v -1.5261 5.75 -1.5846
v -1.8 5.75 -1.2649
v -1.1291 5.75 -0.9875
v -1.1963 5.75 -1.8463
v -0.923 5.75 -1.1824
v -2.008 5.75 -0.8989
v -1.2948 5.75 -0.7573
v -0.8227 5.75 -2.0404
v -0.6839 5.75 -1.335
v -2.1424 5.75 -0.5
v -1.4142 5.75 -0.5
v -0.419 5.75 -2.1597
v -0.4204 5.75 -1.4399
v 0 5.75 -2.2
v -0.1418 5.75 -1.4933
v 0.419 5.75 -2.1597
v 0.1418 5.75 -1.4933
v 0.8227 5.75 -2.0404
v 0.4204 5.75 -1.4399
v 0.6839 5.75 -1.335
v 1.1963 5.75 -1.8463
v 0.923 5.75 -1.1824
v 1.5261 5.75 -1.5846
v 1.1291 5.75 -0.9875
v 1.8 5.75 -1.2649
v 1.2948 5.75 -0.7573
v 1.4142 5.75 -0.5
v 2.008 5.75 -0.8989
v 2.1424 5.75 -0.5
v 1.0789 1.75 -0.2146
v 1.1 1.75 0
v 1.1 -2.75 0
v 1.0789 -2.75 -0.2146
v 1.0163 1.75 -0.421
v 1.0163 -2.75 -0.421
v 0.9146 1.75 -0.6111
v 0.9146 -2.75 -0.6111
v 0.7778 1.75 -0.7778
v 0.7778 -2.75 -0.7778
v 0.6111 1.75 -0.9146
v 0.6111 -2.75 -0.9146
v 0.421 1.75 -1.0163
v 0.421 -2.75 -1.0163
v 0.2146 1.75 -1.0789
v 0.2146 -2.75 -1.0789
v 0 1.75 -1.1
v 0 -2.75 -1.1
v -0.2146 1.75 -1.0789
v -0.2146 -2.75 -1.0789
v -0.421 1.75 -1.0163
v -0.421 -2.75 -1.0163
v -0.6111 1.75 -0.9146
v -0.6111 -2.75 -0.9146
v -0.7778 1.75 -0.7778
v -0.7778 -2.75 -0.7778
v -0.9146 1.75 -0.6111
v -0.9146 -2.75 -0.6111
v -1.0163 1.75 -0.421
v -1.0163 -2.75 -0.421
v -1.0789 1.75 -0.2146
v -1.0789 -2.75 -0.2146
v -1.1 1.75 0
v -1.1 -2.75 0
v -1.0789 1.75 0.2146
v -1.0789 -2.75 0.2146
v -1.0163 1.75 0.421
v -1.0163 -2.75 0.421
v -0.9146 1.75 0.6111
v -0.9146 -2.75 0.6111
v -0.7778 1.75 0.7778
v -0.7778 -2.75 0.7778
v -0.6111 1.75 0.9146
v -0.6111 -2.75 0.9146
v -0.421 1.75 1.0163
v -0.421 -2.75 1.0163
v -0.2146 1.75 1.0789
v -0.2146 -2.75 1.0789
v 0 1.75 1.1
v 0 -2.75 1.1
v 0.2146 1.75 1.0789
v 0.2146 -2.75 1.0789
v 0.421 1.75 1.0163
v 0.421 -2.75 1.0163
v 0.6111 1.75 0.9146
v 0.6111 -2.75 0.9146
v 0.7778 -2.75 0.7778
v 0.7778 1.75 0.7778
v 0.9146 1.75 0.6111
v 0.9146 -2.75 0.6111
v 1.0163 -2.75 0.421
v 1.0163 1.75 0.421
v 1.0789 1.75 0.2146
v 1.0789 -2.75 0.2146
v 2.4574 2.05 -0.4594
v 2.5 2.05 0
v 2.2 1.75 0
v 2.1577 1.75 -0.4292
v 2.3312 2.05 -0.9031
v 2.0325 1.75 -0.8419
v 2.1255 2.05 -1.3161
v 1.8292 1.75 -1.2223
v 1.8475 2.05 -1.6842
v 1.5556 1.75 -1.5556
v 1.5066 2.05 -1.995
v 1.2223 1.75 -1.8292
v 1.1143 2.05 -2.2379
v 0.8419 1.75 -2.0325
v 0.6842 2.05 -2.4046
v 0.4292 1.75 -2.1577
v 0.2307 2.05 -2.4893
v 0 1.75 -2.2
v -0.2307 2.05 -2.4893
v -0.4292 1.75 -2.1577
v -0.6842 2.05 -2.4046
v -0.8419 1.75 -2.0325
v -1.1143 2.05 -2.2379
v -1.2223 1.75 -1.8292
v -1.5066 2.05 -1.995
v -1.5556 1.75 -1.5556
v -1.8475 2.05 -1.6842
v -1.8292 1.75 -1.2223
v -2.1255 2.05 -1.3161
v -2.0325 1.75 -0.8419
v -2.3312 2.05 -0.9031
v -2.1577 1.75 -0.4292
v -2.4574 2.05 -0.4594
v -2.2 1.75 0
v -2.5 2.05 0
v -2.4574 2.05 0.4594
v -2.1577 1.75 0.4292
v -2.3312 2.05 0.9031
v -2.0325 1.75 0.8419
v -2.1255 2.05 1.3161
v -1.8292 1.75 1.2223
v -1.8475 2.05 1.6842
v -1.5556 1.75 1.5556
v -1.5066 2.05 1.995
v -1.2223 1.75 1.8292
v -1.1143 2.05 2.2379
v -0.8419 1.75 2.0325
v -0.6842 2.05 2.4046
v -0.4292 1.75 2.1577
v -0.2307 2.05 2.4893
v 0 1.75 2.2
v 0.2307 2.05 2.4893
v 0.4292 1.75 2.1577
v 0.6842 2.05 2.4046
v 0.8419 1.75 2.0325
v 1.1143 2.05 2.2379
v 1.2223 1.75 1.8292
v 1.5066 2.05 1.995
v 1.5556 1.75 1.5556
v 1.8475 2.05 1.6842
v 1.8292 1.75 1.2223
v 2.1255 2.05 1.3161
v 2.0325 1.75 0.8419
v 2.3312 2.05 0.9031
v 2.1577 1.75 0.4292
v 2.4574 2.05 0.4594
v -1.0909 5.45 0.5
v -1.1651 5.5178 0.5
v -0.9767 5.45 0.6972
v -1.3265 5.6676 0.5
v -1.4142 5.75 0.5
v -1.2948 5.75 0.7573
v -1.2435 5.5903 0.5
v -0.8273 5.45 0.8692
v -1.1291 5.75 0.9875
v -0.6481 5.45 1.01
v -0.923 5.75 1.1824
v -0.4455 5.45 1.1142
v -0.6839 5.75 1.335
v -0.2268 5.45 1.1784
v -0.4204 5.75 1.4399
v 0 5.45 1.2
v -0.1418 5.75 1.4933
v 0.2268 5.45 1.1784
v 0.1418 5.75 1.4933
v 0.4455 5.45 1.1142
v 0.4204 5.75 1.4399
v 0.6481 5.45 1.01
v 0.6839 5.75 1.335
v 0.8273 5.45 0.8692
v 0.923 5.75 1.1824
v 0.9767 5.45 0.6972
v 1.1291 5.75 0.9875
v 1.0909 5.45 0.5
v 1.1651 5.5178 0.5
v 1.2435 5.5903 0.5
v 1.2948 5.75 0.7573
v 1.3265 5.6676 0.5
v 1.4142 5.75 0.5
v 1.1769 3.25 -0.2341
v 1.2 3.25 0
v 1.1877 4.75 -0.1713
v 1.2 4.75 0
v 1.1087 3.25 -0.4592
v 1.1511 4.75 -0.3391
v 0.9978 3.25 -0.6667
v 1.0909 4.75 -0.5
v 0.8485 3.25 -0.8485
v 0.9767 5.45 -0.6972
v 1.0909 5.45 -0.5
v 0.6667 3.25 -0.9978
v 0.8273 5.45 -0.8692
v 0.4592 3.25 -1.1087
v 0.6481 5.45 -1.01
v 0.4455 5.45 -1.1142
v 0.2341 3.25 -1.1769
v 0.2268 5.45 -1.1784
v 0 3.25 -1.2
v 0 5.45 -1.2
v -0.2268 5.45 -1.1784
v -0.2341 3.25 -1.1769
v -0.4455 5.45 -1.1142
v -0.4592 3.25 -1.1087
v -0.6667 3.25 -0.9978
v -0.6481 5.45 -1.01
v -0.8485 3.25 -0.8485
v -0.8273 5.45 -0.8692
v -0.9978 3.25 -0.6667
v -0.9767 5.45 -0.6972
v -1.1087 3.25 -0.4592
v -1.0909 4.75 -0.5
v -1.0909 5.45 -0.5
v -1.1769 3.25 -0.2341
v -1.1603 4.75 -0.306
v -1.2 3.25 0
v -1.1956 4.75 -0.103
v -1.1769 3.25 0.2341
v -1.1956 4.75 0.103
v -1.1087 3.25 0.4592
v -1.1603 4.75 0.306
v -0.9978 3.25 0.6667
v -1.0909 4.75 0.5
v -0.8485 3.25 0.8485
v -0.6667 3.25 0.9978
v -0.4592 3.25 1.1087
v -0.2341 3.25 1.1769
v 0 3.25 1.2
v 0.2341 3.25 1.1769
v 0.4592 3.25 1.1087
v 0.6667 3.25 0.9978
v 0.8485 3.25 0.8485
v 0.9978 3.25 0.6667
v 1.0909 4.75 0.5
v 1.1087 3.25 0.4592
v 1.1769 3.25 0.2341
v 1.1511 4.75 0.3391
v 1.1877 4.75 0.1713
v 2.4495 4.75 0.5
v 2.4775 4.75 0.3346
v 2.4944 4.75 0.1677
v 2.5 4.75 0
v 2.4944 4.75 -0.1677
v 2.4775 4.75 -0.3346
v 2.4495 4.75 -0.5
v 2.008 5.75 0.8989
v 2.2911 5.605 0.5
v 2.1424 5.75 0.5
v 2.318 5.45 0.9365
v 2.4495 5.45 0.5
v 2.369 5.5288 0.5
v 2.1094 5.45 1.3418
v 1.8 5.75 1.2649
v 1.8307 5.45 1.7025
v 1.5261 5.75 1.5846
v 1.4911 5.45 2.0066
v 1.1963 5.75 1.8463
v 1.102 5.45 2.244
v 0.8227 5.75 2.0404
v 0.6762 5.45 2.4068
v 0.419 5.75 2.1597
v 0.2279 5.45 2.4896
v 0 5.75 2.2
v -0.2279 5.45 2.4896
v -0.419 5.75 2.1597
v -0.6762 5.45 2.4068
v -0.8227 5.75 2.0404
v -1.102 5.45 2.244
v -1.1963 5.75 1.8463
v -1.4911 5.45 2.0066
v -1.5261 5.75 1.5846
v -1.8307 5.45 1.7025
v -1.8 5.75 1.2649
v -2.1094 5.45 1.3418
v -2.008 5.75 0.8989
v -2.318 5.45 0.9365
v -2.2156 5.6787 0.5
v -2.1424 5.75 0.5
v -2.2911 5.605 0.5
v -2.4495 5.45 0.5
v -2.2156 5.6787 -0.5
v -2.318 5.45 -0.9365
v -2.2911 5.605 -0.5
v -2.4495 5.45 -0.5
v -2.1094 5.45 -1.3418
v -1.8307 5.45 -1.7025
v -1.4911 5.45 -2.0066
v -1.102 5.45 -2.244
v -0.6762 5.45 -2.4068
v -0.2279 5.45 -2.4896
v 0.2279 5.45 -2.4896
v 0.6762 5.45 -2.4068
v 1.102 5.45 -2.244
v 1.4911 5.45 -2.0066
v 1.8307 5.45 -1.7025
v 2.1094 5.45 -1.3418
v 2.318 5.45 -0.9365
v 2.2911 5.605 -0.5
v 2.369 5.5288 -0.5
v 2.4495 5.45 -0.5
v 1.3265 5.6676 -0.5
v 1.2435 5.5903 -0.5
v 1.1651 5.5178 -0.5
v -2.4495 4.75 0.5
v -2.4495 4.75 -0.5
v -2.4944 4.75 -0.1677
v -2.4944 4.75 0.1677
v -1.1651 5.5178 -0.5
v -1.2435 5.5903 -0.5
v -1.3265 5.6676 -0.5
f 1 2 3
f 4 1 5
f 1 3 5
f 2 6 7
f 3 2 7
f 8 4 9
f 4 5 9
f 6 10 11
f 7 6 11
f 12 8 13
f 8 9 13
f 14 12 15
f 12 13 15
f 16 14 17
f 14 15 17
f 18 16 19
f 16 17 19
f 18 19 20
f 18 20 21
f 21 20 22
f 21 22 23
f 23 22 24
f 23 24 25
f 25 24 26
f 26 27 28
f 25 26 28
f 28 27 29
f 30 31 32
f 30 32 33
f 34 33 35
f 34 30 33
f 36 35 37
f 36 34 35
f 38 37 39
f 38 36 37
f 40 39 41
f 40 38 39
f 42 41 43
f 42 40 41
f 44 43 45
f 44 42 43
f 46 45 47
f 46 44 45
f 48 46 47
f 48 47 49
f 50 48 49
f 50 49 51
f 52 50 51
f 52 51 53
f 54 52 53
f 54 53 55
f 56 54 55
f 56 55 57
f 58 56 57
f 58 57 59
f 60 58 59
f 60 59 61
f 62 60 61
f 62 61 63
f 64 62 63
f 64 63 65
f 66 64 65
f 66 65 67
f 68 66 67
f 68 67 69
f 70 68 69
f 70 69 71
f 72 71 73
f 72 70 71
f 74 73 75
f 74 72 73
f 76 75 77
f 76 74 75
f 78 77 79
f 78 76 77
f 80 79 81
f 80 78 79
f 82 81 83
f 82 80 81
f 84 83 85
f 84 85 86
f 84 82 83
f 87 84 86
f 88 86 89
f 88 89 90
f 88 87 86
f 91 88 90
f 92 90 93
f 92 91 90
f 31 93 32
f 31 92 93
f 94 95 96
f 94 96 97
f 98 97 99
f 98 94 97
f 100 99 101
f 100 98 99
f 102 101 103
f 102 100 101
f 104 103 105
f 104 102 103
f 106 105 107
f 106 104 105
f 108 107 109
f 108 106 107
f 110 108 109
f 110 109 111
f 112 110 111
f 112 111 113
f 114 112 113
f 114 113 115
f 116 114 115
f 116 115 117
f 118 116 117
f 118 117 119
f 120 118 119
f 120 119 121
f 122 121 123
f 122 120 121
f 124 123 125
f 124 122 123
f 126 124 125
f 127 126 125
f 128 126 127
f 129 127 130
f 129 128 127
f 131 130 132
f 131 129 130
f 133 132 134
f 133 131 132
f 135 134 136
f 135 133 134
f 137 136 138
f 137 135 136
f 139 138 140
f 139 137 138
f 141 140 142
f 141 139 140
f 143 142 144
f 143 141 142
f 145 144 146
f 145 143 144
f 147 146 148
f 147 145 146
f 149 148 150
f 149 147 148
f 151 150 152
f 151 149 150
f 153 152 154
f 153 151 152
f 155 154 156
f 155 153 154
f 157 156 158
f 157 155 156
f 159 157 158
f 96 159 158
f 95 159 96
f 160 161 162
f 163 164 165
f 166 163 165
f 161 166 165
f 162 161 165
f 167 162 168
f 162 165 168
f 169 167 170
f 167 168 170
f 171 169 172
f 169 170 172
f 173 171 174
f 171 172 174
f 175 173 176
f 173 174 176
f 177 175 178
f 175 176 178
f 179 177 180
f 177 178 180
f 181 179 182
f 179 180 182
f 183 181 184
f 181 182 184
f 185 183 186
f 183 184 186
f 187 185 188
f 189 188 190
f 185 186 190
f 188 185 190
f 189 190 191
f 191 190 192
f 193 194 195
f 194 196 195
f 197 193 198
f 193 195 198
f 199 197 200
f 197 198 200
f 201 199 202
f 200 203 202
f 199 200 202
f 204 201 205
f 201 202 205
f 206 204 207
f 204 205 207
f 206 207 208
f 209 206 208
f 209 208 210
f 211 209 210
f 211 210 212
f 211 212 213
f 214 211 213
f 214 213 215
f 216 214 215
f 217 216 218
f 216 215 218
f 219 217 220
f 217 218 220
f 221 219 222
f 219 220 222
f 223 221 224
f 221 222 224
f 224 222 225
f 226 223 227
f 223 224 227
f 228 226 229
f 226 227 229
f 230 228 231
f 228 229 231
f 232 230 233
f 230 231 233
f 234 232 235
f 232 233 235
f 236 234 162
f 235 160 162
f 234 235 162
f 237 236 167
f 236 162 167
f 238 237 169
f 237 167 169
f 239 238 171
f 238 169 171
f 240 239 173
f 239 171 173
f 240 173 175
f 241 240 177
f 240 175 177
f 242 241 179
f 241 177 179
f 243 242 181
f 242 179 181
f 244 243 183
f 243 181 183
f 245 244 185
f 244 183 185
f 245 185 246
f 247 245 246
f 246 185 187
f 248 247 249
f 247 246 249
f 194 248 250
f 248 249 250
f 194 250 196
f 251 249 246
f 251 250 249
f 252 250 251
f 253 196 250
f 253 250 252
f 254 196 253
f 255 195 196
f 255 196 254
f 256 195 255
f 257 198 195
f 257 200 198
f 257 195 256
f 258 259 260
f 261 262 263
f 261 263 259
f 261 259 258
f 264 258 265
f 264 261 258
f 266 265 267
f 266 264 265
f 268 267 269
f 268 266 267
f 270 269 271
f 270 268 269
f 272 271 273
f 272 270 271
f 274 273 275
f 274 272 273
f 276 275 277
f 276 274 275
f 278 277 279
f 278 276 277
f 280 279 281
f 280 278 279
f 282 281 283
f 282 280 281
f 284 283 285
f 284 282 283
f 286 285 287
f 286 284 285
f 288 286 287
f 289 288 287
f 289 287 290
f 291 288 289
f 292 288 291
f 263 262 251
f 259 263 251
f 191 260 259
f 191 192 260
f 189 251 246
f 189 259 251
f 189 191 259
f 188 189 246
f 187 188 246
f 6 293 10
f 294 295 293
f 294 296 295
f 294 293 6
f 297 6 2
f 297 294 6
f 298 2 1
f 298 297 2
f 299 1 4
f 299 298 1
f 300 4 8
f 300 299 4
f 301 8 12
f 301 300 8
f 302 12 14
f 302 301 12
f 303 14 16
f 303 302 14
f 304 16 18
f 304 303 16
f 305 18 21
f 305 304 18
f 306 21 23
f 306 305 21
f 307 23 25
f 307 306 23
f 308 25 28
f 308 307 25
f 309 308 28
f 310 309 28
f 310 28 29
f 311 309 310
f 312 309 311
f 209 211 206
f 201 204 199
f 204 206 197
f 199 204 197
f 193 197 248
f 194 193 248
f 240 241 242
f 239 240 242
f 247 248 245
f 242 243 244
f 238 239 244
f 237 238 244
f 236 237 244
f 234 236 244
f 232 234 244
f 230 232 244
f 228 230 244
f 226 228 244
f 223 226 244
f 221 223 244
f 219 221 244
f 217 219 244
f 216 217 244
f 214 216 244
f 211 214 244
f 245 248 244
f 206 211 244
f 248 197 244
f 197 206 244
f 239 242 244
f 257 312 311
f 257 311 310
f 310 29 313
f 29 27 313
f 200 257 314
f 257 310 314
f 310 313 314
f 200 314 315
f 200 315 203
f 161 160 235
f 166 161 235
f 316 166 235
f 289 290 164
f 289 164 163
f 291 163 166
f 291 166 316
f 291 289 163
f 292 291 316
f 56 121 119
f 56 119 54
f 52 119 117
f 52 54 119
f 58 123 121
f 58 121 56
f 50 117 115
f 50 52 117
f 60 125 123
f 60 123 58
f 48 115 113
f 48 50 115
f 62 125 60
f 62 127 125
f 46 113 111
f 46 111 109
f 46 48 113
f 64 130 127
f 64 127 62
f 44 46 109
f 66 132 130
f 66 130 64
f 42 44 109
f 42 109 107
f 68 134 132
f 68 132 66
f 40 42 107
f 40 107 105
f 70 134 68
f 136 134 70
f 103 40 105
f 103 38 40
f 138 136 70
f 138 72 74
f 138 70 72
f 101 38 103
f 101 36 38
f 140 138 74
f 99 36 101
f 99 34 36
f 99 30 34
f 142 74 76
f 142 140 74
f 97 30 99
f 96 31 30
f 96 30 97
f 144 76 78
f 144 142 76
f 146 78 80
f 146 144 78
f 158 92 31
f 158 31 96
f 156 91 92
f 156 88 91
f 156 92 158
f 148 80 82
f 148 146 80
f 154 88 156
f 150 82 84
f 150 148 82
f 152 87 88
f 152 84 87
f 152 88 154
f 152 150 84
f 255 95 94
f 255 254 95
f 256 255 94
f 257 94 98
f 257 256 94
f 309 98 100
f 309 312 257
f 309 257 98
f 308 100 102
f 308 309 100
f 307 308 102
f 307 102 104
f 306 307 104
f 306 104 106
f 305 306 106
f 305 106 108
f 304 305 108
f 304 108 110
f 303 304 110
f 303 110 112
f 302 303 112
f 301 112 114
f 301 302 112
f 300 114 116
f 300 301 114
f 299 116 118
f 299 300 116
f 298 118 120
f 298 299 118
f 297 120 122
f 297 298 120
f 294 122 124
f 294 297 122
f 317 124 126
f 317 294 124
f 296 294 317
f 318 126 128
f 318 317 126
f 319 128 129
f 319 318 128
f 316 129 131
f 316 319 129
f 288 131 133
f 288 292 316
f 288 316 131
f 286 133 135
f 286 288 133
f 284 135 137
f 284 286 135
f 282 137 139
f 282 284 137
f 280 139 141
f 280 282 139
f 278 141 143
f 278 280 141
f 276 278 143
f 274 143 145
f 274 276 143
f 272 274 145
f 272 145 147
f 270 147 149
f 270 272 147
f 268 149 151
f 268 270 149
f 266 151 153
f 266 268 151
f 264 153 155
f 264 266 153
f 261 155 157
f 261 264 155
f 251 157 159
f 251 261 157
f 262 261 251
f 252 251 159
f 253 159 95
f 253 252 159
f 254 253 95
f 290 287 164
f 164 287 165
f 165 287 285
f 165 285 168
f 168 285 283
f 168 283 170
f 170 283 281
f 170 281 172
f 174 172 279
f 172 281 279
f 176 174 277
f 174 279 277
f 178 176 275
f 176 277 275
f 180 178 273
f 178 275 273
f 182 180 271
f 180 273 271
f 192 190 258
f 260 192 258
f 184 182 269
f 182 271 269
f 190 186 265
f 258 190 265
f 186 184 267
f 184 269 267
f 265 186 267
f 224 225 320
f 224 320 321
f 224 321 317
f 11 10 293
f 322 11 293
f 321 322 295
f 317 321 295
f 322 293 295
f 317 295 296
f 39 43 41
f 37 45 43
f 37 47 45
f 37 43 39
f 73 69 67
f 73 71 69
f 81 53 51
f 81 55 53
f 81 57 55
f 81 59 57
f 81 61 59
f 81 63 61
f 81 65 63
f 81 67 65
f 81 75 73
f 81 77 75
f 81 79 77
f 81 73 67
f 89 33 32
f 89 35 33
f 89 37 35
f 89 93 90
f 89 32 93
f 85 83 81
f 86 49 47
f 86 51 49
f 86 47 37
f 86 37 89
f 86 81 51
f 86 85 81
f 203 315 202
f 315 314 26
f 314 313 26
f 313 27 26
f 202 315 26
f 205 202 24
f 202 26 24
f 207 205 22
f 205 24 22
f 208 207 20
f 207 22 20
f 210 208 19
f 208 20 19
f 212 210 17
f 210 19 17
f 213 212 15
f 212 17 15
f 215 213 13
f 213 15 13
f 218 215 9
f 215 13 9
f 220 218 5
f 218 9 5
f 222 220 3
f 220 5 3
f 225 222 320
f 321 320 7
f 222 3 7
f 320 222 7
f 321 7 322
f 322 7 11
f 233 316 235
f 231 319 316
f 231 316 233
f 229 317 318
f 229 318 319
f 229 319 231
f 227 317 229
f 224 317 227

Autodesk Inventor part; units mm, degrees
ref_plane "YZ Plane" through (0, 0, 0) normal (1, 0, 0) x (0, 1, 0)
ref_plane "XZ Plane" through (0, 0, 0) normal (0, 1, 0) x (-1, 0, 0)
ref_plane "XY Plane" through (0, 0, 0) normal (0, 0, 1) x (1, 0, 0)
sketch "スケッチ1" plane through (0, 0, 0) normal (0, 0, 1) x (1, 0, 0)
  line L0 (0, -3.25) -> (0.8, -3.25)
  line L1 (0.8, -3.25) -> (1.1, -2.95)
  line L2 (1.1, -2.95) -> (1.1, 1.25)
  line L3 (1.1, 1.25) -> (1.1, 1.25)
  line L4 (1.1, 1.25) -> (1.1, 1.75)
  line L5 (1.1, 1.75) -> (2.2, 1.75)
  line L6 (2.5, 5.45) -> (2.2, 5.75)
  line L7 (2.2, 5.75) -> (1.5, 5.75)
  line L8 (1.5, 5.75) -> (1.2, 5.45)
  line L9 (0, 7.4044) -> (0, -7.4044) construction
  line L10 (0, -3.25) -> (0, 3.25)
  line L11 (0, 3.25) -> (1.2, 3.25)
  line L12 (1.2, 3.25) -> (1.2, 5.45)
  line L13 (2.2, 1.75) -> (2.5, 2.05)
  line L14 (2.5, 2.05) -> (2.5, 5.45)
  point P0 (0, 0)
  point P1 (0, 0)
  dimension "d0" = 2.2
  dimension "d1" = 5
  dimension "d2" = 0.3
  dimension "d3" = 0.3
  dimension "d4" = 2.2
  dimension "d5" = 0.5
  dimension "d6" = 4
  dimension "d8" = 0.3
  dimension "d9" = 2.4
  dimension "d10" = 2.5
  dimension "d11" = 0.3
  dimension "d12" = 0.3
  dimension "d13" = 0.3
  dimension "d14" = 0.3
  dimension "d15" = 5
revolve "回転1" add sketch "スケッチ1" angle 360 about axis through (0, 7.4044, 0) along (0, -1, 0)
sketch "スケッチ2" plane through (0, -3.25, 0) normal (0, -1, 0) x (1, 0, 0)
  circle A0 centre (0, 0) radius 0.8 projected
  circle A1 centre (0, 0) radius 9.0242
extrude "押し出し1" cut sketch "スケッチ2" against normal blind 0.5 contours A0 | A1
sketch "スケッチ3" plane through (0, 5.75, 0) normal (0, 1, 0) x (1, 0, 0)
  circle A0 centre (0, 0) radius 2.5 projected
  line L0 (2.5, 0) -> (-2.5, 0)
  line L1 (2.5, -0.5) -> (-2.5, -0.5)
  line L2 (2.5, 0.5) -> (-2.5, 0.5)
  line L3 (2.5, -0.5) -> (2.5, 0.5)
  line L4 (-2.5, -0.5) -> (-2.5, 0.5)
  point P0 (0, 0)
  point P1 (-2.4495, -0.5)
  point P2 (2.4495, -0.5)
  point P3 (2.4495, 0.5)
  point P4 (-2.4495, 0.5)
  dimension "d19" = 0.5
extrude "押し出し2" cut sketch "スケッチ3" against normal blind 1 contours L0 A0 L2 | A0 L1 L0
equation "\"d3\" = d2"
equation "\"d11\" = d8"
equation "\"d12\" = d8"
equation "\"d13\" = d12"
equation "\"d14\" = d13"
properties part number "BRU-2604S" material "ステンレス鋼 AISI 304"
